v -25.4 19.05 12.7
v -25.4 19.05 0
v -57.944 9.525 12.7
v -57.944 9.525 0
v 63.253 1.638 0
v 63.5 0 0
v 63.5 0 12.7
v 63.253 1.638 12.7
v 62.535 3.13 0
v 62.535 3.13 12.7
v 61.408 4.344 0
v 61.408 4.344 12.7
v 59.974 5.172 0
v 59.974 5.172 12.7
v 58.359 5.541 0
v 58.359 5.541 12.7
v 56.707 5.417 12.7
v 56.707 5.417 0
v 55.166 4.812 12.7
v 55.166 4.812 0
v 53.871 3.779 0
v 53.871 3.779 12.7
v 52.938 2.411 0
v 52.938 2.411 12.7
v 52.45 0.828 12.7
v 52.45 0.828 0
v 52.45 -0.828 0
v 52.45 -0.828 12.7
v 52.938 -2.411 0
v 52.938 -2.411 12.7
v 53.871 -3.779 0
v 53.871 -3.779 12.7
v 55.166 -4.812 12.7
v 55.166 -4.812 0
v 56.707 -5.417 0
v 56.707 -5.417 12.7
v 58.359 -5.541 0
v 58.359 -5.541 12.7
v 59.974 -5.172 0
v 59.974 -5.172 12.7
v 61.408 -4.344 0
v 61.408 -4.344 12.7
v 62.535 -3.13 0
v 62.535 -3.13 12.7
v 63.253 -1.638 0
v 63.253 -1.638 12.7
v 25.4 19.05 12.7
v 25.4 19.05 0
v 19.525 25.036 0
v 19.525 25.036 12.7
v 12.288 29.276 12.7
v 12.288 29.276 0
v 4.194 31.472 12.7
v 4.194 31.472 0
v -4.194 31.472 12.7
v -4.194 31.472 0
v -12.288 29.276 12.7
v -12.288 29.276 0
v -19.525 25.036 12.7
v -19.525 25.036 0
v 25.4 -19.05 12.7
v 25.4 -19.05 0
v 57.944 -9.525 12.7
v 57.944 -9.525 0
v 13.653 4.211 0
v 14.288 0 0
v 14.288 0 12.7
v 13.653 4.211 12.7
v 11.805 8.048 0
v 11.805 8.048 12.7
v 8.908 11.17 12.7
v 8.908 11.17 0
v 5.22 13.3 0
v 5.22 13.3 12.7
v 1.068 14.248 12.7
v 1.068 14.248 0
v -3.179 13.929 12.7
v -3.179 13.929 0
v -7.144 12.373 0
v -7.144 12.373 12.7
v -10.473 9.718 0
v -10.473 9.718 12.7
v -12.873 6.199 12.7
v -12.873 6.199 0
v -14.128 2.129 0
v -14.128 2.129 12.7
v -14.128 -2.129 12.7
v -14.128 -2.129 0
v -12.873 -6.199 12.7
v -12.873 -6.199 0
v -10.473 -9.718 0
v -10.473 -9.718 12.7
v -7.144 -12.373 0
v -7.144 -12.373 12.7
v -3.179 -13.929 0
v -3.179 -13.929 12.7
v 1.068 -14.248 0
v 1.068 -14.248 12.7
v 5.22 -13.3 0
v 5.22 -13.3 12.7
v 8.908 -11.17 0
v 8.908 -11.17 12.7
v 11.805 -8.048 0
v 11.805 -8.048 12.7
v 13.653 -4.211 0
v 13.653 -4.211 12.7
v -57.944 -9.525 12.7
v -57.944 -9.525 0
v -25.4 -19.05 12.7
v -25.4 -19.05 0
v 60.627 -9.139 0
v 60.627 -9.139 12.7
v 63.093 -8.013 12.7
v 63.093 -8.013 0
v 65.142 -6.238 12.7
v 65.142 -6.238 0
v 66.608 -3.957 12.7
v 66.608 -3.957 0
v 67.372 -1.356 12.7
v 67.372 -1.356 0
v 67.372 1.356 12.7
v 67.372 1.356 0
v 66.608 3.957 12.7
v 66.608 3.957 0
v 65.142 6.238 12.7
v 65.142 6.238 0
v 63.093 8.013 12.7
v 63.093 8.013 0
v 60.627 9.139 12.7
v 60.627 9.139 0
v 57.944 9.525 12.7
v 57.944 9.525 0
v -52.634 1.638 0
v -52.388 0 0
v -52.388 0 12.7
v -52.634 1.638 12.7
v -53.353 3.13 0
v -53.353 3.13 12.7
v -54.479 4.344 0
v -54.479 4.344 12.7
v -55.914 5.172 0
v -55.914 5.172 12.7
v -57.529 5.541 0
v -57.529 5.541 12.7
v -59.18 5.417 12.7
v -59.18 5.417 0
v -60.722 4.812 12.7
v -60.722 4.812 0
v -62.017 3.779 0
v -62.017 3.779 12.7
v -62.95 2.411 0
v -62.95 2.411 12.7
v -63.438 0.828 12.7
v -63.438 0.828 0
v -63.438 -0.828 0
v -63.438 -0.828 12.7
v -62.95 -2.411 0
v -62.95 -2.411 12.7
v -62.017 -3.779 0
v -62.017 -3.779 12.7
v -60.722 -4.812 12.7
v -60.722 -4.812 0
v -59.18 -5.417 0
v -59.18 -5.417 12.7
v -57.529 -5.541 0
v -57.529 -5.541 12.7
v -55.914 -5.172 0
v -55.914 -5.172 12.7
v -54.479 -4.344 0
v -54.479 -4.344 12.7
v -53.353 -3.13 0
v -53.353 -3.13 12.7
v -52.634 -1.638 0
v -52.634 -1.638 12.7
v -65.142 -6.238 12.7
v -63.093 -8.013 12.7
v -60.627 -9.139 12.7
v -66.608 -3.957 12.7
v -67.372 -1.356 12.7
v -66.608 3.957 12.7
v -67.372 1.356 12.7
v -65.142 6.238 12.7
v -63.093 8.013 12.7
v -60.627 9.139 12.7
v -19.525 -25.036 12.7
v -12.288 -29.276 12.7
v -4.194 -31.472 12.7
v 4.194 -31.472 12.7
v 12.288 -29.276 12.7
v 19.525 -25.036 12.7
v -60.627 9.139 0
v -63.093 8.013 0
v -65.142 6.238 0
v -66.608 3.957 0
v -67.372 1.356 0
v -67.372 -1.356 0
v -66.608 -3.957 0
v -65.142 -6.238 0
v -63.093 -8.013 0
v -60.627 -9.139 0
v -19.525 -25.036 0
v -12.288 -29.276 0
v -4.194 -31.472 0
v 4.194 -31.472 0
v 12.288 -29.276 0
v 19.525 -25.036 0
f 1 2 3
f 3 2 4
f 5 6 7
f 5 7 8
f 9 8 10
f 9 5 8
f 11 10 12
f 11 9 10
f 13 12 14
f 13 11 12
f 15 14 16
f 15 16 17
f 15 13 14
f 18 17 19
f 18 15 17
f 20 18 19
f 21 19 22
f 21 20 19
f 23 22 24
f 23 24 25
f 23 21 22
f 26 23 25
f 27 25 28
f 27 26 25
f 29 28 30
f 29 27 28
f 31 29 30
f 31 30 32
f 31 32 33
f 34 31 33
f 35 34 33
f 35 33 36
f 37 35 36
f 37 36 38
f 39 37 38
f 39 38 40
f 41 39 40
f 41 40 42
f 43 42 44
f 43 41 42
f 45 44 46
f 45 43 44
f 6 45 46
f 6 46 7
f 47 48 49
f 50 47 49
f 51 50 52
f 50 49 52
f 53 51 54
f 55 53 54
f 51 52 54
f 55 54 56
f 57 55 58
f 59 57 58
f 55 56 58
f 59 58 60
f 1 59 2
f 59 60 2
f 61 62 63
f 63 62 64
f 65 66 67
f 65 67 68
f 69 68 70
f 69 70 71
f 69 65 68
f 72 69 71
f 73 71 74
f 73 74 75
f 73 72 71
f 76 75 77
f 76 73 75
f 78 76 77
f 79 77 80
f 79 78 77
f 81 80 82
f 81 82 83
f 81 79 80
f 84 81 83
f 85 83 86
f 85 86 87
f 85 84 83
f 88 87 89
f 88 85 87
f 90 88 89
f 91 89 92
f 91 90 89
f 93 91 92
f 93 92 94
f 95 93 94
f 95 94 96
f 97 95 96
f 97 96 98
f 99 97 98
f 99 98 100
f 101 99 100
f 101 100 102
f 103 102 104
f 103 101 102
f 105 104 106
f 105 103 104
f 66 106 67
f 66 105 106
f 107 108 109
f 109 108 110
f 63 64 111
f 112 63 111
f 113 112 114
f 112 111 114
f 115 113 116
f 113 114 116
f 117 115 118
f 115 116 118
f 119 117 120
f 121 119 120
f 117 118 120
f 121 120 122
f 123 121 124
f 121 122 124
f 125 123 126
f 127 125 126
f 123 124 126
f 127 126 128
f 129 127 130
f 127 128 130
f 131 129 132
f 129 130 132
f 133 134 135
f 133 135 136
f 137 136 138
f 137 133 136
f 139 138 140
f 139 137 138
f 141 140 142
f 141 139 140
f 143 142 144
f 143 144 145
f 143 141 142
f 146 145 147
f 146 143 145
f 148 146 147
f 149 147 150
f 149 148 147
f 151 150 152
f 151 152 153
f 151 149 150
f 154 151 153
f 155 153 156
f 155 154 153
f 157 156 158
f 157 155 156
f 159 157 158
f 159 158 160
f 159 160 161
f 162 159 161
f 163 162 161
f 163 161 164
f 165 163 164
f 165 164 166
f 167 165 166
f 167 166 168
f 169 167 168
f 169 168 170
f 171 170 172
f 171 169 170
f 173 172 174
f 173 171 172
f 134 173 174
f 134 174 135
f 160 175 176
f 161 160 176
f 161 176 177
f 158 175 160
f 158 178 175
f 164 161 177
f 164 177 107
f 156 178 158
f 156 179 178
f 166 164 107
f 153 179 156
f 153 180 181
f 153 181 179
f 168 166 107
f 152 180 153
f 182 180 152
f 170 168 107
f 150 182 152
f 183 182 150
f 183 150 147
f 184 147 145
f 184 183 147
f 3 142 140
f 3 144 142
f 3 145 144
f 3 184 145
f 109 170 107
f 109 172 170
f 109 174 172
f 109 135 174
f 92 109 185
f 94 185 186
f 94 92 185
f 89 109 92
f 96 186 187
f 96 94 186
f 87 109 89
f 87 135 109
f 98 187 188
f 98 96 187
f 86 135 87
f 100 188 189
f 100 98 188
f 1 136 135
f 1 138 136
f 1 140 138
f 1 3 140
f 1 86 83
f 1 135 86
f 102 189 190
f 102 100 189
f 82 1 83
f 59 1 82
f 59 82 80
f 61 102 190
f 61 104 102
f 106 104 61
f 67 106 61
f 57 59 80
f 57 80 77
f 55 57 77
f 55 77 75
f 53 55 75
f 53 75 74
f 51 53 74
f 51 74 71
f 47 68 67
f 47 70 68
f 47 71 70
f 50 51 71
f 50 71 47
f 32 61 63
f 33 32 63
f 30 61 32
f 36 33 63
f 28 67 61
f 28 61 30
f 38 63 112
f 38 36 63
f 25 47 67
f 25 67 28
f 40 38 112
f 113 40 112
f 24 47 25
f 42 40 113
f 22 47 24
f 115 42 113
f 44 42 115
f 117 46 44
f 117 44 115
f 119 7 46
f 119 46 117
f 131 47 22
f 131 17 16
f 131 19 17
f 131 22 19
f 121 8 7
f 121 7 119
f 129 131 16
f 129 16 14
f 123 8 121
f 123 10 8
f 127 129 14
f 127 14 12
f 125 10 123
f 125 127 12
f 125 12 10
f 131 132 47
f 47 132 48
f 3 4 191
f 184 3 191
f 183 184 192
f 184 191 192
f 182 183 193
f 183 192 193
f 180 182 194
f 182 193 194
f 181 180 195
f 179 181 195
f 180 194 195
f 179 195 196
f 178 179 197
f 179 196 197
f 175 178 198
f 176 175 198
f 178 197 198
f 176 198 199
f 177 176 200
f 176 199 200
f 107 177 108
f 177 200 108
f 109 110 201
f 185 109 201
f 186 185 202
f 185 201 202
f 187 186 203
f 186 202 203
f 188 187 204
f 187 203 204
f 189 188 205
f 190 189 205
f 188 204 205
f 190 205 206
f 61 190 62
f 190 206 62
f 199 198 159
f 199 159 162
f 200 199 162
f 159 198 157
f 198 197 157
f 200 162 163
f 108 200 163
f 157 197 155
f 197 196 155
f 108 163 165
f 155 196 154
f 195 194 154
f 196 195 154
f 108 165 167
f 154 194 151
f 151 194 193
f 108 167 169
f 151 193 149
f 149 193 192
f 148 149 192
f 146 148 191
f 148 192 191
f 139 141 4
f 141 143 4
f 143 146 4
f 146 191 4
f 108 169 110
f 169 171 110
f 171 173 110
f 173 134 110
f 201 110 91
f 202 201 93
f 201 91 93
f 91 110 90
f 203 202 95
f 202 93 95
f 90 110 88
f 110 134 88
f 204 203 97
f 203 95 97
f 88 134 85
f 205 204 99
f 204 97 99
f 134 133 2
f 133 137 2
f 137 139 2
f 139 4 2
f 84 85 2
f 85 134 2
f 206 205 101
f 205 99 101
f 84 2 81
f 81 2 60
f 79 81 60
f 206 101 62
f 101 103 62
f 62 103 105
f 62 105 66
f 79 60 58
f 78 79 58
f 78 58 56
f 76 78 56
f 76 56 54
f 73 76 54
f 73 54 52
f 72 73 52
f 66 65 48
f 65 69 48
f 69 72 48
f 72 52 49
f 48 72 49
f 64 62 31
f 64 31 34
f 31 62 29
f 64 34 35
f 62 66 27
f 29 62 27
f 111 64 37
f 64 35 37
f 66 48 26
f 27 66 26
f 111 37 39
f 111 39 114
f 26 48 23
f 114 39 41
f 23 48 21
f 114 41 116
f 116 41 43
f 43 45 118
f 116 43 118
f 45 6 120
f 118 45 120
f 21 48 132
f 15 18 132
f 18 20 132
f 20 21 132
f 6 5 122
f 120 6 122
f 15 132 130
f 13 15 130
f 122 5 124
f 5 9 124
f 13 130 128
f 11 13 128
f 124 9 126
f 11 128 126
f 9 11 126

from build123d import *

# Parameters (mm, degrees)
F0_R     = 14.2875
F0_R_2   = 5.55625
F1_DEPTH = 12.7


with BuildPart() as f1:
    # F0 (on Top) → F1 (new body)
    with BuildSketch(Plane.XY):
        with BuildLine():
            ThreePointArc((25.4, -19.05), (30.120695, -10.040232), (31.75, 0))
            ThreePointArc((31.75, 0), (30.120695, 10.040232), (25.4, 19.05))
            ThreePointArc((25.4, 19.05), (0, 31.75), (-25.4, 19.05))
            ThreePointArc((-25.4, 19.05), (-31.75, 0), (-25.4, -19.05))
            ThreePointArc((-25.4, -19.05), (0, -31.75), (25.4, -19.05))
        make_face()
        Circle(F0_R, mode=Mode.SUBTRACT)
        with BuildLine():
            ThreePointArc((-25.4, -19.05), (-31.75, 0), (-25.4, 19.05))
            Line((-25.4, 19.05), (-57.94375, 9.525))
            ThreePointArc((-57.94375, 9.525), (-67.46875, 0), (-57.94375, -9.525))
            Line((-57.94375, -9.525), (-25.4, -19.05))
        make_face()
        with Locations((-57.94375, 0)):
            Circle(F0_R_2, mode=Mode.SUBTRACT)
        with BuildLine():
            ThreePointArc((25.4, 19.05), (30.120695, 10.040232), (31.75, 0))
            ThreePointArc((31.75, 0), (30.120695, -10.040232), (25.4, -19.05))
            Line((25.4, -19.05), (57.94375, -9.525))
            ThreePointArc((57.94375, -9.525), (67.46875, 0), (57.94375, 9.525))
            Line((57.94375, 9.525), (25.4, 19.05))
        make_face()
        with Locations((57.94375, 0)):
            Circle(F0_R_2, mode=Mode.SUBTRACT)
    extrude(amount=F1_DEPTH)


solid = f1.part
